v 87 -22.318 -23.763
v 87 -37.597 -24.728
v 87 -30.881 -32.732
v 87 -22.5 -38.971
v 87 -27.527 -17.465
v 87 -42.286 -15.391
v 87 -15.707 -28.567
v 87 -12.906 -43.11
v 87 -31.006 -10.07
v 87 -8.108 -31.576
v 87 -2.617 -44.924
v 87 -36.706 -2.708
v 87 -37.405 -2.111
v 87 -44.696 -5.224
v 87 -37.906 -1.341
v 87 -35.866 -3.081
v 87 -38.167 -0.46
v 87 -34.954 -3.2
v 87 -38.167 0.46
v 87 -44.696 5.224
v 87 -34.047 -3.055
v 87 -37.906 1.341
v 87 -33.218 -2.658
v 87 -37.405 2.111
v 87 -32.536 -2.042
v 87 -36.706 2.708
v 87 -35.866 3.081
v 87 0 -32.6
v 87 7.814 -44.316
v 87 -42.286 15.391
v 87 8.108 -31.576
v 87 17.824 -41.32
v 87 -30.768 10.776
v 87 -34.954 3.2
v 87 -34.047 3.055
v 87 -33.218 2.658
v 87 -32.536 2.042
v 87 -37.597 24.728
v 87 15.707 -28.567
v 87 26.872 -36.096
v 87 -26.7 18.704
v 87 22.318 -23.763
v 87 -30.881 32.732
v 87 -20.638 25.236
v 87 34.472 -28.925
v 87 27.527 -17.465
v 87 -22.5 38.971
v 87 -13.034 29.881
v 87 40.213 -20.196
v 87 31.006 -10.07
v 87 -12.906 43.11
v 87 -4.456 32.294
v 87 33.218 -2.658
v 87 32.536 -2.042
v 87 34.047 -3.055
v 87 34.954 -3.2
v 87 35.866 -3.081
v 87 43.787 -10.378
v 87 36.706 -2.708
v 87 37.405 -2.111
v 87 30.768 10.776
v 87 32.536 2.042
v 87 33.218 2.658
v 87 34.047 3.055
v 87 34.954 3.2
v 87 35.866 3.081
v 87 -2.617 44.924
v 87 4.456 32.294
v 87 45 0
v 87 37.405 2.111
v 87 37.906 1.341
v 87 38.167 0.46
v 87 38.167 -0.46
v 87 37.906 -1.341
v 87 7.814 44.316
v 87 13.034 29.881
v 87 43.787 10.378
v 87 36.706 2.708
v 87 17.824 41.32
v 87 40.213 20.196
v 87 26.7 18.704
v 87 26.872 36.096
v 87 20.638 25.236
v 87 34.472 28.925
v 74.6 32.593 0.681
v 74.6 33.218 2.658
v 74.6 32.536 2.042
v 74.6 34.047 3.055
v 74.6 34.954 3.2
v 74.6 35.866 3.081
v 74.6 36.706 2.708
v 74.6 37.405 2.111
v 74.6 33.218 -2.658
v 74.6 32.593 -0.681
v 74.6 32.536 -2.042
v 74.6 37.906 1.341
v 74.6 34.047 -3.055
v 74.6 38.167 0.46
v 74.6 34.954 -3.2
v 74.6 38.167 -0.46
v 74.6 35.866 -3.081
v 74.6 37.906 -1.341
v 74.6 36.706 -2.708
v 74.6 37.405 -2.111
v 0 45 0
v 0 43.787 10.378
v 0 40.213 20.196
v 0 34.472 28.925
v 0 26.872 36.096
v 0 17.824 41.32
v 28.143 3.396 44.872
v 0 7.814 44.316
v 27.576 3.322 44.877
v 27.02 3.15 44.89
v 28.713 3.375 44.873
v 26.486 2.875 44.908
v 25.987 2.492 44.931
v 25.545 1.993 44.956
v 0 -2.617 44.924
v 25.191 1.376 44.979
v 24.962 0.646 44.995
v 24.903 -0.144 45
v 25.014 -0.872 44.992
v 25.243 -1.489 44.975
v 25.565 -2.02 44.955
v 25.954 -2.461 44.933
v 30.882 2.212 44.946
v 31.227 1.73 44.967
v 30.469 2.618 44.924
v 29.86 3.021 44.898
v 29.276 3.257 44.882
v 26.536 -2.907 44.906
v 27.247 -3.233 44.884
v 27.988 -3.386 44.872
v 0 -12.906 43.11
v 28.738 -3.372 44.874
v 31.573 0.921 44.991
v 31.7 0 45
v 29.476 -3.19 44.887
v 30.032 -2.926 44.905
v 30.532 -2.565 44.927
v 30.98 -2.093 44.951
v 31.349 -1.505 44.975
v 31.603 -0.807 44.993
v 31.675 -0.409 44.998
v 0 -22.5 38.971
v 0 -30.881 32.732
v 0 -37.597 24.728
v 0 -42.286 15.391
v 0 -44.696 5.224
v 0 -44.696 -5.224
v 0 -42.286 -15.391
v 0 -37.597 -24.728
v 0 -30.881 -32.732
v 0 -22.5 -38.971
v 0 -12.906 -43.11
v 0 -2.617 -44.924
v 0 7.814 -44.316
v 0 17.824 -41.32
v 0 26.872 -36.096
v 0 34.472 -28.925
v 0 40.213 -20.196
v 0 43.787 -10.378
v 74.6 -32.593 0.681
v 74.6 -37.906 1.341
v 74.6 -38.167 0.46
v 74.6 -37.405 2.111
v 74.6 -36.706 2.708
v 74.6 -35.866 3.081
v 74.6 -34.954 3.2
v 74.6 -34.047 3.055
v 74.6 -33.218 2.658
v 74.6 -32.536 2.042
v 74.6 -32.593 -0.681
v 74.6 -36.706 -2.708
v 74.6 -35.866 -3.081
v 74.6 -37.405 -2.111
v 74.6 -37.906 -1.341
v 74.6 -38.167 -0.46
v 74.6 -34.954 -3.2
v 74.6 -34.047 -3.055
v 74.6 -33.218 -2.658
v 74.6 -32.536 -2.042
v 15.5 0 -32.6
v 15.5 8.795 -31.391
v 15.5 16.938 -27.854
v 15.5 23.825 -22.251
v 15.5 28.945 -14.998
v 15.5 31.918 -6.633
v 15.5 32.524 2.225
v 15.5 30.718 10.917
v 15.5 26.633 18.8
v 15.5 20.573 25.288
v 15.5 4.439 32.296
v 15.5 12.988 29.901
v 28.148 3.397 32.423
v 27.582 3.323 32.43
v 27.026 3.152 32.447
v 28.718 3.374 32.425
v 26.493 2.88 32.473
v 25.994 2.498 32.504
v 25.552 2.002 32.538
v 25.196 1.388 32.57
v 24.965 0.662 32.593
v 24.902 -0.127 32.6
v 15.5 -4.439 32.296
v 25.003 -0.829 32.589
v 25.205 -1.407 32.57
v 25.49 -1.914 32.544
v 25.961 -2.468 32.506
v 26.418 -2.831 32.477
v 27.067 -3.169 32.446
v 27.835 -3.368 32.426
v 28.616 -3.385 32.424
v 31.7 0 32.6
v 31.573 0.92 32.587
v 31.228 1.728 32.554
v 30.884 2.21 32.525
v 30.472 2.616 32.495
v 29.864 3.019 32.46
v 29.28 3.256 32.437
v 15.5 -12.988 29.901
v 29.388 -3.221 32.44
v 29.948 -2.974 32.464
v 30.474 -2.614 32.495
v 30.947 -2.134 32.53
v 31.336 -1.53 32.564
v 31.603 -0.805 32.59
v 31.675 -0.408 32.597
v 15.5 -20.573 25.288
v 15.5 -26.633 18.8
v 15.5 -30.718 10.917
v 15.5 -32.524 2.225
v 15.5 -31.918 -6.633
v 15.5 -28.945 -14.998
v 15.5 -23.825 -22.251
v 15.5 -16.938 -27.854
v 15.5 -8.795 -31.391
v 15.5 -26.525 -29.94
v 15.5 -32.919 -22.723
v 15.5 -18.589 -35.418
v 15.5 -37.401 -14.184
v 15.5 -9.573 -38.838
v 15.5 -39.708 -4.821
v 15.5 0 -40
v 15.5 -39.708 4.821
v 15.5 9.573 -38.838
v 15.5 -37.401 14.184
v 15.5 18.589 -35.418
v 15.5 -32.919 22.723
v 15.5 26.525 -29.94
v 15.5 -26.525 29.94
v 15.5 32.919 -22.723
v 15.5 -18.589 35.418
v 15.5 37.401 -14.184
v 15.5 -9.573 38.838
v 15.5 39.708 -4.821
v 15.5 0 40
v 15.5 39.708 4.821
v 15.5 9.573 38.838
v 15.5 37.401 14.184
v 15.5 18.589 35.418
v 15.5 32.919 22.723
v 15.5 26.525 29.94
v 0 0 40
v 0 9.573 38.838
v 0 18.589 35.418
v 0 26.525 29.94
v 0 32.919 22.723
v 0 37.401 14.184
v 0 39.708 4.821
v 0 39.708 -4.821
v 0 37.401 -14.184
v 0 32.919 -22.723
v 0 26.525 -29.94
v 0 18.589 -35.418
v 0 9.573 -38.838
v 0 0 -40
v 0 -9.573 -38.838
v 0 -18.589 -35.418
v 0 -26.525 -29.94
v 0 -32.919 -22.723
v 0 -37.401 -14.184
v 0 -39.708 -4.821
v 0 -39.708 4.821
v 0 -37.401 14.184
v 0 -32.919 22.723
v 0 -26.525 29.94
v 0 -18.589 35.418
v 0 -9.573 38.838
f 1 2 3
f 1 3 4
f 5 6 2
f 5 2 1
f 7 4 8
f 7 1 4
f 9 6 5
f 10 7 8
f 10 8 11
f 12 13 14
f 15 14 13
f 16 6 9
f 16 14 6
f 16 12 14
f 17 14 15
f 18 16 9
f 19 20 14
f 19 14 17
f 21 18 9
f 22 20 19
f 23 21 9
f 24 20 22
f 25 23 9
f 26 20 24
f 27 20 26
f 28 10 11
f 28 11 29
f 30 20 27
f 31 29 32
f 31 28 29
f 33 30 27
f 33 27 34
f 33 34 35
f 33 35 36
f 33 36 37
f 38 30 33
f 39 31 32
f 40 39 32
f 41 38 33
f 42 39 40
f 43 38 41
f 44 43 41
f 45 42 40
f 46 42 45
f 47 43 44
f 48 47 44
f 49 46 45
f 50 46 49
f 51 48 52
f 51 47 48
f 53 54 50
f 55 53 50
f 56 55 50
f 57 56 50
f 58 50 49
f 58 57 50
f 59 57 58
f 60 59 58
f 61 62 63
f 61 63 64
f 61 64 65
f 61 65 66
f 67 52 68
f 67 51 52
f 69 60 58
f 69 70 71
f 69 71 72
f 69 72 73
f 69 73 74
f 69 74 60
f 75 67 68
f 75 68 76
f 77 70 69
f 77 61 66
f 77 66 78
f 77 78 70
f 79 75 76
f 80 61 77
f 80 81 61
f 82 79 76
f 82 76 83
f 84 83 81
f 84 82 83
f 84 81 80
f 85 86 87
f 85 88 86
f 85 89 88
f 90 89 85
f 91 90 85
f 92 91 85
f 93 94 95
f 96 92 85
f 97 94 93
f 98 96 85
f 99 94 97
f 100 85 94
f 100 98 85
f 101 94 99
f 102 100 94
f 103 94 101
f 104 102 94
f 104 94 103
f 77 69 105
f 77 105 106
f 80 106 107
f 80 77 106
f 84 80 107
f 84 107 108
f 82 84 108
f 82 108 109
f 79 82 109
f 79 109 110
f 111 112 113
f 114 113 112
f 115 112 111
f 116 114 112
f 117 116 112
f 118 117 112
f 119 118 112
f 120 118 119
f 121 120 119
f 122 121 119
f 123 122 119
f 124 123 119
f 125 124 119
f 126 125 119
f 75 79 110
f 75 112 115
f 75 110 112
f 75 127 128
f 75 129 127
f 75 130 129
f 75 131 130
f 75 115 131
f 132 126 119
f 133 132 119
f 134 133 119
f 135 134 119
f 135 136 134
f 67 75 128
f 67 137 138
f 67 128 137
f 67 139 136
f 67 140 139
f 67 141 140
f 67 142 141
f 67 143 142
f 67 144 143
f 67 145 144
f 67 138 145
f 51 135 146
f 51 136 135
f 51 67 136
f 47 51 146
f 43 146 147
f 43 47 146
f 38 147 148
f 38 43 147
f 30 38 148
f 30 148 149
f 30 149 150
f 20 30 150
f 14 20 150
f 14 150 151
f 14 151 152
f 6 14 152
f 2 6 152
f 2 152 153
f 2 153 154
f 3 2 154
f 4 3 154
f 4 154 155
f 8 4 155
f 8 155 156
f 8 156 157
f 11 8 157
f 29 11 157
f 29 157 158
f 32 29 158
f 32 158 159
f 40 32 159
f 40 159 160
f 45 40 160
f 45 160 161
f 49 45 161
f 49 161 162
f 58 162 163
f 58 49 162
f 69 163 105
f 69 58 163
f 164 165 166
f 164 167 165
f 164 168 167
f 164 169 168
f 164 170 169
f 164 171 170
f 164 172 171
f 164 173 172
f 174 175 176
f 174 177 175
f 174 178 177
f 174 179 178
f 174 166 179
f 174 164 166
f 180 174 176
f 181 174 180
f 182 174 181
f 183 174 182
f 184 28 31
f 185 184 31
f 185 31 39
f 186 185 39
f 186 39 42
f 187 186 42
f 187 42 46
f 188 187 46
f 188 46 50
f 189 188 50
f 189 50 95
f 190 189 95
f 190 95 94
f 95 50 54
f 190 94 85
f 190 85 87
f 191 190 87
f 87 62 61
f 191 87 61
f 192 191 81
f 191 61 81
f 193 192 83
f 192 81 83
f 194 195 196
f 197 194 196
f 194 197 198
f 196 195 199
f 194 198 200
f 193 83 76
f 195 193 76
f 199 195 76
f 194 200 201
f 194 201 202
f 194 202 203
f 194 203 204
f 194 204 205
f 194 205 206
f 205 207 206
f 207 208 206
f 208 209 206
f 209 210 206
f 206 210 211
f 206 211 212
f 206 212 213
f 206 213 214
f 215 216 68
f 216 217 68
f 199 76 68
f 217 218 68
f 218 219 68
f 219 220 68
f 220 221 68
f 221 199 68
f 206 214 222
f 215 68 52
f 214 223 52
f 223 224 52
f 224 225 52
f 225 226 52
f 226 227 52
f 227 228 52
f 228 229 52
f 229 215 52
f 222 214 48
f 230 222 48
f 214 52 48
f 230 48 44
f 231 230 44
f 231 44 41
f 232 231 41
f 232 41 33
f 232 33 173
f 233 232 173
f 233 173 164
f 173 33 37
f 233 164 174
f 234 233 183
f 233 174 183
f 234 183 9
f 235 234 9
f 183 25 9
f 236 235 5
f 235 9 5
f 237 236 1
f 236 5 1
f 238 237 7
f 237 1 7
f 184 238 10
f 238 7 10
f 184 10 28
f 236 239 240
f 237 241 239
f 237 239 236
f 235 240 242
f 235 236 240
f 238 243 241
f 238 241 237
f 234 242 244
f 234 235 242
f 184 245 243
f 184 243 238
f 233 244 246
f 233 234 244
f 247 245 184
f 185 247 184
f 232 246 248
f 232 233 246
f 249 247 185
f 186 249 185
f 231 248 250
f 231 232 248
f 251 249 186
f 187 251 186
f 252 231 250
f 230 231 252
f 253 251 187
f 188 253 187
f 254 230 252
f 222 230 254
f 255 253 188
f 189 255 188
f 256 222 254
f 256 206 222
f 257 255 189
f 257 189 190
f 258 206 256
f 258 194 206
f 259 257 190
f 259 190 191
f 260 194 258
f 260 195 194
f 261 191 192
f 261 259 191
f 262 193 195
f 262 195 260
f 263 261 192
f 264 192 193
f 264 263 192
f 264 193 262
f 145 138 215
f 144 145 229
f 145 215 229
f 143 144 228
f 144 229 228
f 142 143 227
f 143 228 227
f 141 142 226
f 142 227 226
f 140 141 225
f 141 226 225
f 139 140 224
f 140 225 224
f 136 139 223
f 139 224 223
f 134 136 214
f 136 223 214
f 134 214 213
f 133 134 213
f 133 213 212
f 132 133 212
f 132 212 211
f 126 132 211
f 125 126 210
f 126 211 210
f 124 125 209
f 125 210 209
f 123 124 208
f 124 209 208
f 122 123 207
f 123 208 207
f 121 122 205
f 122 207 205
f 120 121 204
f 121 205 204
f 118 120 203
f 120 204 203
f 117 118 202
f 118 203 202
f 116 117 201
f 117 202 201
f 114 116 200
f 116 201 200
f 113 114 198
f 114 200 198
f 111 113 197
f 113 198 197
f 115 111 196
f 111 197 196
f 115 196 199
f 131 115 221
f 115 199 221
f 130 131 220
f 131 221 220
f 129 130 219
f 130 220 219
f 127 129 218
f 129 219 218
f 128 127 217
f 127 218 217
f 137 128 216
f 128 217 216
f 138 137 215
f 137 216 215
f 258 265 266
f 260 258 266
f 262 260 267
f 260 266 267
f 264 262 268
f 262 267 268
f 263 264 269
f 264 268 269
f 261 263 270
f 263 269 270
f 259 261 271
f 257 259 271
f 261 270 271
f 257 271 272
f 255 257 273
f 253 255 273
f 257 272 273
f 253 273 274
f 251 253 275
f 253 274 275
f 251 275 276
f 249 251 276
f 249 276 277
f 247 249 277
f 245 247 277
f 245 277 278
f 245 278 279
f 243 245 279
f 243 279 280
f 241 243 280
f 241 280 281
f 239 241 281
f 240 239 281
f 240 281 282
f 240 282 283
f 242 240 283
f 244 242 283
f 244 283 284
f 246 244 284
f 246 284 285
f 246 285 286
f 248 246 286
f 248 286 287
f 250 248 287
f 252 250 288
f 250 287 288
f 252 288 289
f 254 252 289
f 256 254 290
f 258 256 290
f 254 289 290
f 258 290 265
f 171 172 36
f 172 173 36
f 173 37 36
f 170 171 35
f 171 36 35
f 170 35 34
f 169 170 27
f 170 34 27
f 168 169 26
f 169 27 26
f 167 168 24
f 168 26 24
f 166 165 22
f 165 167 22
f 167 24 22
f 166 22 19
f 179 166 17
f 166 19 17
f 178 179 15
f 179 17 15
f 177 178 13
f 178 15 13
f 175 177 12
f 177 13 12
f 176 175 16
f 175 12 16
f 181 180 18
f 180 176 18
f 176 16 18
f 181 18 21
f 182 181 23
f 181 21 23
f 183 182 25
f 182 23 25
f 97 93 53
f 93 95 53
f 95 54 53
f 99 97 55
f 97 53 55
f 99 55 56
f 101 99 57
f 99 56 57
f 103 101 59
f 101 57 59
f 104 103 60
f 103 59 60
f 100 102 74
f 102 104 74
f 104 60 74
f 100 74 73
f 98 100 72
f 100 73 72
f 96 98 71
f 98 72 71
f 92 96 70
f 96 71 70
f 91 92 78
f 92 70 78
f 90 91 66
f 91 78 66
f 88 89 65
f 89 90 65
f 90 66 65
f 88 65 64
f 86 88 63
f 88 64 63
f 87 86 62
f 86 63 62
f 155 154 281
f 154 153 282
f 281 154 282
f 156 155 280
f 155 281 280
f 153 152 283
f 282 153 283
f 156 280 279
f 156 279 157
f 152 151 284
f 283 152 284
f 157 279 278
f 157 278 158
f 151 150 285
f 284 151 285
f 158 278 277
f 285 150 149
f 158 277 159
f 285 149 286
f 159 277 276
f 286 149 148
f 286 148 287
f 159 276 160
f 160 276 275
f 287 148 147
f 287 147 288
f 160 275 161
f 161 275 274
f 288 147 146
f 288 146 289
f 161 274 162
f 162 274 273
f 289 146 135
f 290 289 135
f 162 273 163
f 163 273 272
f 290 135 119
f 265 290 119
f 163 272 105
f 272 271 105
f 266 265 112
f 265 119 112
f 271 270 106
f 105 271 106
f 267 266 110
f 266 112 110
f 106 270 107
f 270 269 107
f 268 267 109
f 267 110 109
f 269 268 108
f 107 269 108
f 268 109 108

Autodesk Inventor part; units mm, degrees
ref_plane "YZ Plane" through (0, 0, 0) normal (1, 0, 0) x (0, 1, 0)
ref_plane "XZ Plane" through (0, 0, 0) normal (0, 1, 0) x (-1, 0, 0)
ref_plane "XY Plane" through (0, 0, 0) normal (0, 0, 1) x (1, 0, 0)
sketch "Sketch1" plane through (0, 0, 0) normal (0, 0, 1) x (1, 0, 0)
  line L0 (0, 0) -> (87, 0)
  line L1 (0, 0) -> (0, 45)
  line L2 (0, 45) -> (87, 45)
  line L3 (87, 45) -> (87, 0)
  dimension "d0" = 87
  dimension "d2" = 45
revolve "Revolution1" add sketch "Sketch1" angle 360 about axis through (0, 0, 0) along (1, 0, 0)
sketch "Sketch2" plane through (87, 0, 0) normal (1, 0, 0) x (0, 0, -1)
  circle A0 centre (0, 0) radius 32.6
  dimension "d4" = 65.2
extrude "Extrusion1" cut sketch "Sketch2" against normal through all
sketch "Sketch3" plane through (0, 0, 0) normal (-1, 0, 0) x (0, 0, 1)
  point P0 (0, 0)
sketch "Sketch4" plane through (0, 0, 0) normal (-1, 0, 0) x (0, 0, 1)
  circle A0 centre (0, 0) radius 40
  dimension "d7" = 80
extrude "Extrusion2" cut sketch "Sketch4" against normal blind 15.5
sketch "Sketch5" plane through (87, 0, 0) normal (1, 0, 0) x (0, 0, -1)
  circle A0 centre (0, 35) radius 3.2
  circle A1 centre (0, -35) radius 3.2
  point P0 (0, 0)
  dimension "d12" = 6.4
  dimension "d13" = 6.4
extrude "Extrusion3" cut sketch "Sketch5" against normal blind 12.4
sketch "Sketch6" plane through (0, 0, 0) normal (0, 0, 1) x (1, 0, 0)
  circle A0 centre (28.3, 0) radius 3.4
  point P0 (0, 0)
  dimension "d17" = 6.8
extrude "Extrusion4" cut sketch "Sketch6" along normal through all
properties part number "porca redonda"
